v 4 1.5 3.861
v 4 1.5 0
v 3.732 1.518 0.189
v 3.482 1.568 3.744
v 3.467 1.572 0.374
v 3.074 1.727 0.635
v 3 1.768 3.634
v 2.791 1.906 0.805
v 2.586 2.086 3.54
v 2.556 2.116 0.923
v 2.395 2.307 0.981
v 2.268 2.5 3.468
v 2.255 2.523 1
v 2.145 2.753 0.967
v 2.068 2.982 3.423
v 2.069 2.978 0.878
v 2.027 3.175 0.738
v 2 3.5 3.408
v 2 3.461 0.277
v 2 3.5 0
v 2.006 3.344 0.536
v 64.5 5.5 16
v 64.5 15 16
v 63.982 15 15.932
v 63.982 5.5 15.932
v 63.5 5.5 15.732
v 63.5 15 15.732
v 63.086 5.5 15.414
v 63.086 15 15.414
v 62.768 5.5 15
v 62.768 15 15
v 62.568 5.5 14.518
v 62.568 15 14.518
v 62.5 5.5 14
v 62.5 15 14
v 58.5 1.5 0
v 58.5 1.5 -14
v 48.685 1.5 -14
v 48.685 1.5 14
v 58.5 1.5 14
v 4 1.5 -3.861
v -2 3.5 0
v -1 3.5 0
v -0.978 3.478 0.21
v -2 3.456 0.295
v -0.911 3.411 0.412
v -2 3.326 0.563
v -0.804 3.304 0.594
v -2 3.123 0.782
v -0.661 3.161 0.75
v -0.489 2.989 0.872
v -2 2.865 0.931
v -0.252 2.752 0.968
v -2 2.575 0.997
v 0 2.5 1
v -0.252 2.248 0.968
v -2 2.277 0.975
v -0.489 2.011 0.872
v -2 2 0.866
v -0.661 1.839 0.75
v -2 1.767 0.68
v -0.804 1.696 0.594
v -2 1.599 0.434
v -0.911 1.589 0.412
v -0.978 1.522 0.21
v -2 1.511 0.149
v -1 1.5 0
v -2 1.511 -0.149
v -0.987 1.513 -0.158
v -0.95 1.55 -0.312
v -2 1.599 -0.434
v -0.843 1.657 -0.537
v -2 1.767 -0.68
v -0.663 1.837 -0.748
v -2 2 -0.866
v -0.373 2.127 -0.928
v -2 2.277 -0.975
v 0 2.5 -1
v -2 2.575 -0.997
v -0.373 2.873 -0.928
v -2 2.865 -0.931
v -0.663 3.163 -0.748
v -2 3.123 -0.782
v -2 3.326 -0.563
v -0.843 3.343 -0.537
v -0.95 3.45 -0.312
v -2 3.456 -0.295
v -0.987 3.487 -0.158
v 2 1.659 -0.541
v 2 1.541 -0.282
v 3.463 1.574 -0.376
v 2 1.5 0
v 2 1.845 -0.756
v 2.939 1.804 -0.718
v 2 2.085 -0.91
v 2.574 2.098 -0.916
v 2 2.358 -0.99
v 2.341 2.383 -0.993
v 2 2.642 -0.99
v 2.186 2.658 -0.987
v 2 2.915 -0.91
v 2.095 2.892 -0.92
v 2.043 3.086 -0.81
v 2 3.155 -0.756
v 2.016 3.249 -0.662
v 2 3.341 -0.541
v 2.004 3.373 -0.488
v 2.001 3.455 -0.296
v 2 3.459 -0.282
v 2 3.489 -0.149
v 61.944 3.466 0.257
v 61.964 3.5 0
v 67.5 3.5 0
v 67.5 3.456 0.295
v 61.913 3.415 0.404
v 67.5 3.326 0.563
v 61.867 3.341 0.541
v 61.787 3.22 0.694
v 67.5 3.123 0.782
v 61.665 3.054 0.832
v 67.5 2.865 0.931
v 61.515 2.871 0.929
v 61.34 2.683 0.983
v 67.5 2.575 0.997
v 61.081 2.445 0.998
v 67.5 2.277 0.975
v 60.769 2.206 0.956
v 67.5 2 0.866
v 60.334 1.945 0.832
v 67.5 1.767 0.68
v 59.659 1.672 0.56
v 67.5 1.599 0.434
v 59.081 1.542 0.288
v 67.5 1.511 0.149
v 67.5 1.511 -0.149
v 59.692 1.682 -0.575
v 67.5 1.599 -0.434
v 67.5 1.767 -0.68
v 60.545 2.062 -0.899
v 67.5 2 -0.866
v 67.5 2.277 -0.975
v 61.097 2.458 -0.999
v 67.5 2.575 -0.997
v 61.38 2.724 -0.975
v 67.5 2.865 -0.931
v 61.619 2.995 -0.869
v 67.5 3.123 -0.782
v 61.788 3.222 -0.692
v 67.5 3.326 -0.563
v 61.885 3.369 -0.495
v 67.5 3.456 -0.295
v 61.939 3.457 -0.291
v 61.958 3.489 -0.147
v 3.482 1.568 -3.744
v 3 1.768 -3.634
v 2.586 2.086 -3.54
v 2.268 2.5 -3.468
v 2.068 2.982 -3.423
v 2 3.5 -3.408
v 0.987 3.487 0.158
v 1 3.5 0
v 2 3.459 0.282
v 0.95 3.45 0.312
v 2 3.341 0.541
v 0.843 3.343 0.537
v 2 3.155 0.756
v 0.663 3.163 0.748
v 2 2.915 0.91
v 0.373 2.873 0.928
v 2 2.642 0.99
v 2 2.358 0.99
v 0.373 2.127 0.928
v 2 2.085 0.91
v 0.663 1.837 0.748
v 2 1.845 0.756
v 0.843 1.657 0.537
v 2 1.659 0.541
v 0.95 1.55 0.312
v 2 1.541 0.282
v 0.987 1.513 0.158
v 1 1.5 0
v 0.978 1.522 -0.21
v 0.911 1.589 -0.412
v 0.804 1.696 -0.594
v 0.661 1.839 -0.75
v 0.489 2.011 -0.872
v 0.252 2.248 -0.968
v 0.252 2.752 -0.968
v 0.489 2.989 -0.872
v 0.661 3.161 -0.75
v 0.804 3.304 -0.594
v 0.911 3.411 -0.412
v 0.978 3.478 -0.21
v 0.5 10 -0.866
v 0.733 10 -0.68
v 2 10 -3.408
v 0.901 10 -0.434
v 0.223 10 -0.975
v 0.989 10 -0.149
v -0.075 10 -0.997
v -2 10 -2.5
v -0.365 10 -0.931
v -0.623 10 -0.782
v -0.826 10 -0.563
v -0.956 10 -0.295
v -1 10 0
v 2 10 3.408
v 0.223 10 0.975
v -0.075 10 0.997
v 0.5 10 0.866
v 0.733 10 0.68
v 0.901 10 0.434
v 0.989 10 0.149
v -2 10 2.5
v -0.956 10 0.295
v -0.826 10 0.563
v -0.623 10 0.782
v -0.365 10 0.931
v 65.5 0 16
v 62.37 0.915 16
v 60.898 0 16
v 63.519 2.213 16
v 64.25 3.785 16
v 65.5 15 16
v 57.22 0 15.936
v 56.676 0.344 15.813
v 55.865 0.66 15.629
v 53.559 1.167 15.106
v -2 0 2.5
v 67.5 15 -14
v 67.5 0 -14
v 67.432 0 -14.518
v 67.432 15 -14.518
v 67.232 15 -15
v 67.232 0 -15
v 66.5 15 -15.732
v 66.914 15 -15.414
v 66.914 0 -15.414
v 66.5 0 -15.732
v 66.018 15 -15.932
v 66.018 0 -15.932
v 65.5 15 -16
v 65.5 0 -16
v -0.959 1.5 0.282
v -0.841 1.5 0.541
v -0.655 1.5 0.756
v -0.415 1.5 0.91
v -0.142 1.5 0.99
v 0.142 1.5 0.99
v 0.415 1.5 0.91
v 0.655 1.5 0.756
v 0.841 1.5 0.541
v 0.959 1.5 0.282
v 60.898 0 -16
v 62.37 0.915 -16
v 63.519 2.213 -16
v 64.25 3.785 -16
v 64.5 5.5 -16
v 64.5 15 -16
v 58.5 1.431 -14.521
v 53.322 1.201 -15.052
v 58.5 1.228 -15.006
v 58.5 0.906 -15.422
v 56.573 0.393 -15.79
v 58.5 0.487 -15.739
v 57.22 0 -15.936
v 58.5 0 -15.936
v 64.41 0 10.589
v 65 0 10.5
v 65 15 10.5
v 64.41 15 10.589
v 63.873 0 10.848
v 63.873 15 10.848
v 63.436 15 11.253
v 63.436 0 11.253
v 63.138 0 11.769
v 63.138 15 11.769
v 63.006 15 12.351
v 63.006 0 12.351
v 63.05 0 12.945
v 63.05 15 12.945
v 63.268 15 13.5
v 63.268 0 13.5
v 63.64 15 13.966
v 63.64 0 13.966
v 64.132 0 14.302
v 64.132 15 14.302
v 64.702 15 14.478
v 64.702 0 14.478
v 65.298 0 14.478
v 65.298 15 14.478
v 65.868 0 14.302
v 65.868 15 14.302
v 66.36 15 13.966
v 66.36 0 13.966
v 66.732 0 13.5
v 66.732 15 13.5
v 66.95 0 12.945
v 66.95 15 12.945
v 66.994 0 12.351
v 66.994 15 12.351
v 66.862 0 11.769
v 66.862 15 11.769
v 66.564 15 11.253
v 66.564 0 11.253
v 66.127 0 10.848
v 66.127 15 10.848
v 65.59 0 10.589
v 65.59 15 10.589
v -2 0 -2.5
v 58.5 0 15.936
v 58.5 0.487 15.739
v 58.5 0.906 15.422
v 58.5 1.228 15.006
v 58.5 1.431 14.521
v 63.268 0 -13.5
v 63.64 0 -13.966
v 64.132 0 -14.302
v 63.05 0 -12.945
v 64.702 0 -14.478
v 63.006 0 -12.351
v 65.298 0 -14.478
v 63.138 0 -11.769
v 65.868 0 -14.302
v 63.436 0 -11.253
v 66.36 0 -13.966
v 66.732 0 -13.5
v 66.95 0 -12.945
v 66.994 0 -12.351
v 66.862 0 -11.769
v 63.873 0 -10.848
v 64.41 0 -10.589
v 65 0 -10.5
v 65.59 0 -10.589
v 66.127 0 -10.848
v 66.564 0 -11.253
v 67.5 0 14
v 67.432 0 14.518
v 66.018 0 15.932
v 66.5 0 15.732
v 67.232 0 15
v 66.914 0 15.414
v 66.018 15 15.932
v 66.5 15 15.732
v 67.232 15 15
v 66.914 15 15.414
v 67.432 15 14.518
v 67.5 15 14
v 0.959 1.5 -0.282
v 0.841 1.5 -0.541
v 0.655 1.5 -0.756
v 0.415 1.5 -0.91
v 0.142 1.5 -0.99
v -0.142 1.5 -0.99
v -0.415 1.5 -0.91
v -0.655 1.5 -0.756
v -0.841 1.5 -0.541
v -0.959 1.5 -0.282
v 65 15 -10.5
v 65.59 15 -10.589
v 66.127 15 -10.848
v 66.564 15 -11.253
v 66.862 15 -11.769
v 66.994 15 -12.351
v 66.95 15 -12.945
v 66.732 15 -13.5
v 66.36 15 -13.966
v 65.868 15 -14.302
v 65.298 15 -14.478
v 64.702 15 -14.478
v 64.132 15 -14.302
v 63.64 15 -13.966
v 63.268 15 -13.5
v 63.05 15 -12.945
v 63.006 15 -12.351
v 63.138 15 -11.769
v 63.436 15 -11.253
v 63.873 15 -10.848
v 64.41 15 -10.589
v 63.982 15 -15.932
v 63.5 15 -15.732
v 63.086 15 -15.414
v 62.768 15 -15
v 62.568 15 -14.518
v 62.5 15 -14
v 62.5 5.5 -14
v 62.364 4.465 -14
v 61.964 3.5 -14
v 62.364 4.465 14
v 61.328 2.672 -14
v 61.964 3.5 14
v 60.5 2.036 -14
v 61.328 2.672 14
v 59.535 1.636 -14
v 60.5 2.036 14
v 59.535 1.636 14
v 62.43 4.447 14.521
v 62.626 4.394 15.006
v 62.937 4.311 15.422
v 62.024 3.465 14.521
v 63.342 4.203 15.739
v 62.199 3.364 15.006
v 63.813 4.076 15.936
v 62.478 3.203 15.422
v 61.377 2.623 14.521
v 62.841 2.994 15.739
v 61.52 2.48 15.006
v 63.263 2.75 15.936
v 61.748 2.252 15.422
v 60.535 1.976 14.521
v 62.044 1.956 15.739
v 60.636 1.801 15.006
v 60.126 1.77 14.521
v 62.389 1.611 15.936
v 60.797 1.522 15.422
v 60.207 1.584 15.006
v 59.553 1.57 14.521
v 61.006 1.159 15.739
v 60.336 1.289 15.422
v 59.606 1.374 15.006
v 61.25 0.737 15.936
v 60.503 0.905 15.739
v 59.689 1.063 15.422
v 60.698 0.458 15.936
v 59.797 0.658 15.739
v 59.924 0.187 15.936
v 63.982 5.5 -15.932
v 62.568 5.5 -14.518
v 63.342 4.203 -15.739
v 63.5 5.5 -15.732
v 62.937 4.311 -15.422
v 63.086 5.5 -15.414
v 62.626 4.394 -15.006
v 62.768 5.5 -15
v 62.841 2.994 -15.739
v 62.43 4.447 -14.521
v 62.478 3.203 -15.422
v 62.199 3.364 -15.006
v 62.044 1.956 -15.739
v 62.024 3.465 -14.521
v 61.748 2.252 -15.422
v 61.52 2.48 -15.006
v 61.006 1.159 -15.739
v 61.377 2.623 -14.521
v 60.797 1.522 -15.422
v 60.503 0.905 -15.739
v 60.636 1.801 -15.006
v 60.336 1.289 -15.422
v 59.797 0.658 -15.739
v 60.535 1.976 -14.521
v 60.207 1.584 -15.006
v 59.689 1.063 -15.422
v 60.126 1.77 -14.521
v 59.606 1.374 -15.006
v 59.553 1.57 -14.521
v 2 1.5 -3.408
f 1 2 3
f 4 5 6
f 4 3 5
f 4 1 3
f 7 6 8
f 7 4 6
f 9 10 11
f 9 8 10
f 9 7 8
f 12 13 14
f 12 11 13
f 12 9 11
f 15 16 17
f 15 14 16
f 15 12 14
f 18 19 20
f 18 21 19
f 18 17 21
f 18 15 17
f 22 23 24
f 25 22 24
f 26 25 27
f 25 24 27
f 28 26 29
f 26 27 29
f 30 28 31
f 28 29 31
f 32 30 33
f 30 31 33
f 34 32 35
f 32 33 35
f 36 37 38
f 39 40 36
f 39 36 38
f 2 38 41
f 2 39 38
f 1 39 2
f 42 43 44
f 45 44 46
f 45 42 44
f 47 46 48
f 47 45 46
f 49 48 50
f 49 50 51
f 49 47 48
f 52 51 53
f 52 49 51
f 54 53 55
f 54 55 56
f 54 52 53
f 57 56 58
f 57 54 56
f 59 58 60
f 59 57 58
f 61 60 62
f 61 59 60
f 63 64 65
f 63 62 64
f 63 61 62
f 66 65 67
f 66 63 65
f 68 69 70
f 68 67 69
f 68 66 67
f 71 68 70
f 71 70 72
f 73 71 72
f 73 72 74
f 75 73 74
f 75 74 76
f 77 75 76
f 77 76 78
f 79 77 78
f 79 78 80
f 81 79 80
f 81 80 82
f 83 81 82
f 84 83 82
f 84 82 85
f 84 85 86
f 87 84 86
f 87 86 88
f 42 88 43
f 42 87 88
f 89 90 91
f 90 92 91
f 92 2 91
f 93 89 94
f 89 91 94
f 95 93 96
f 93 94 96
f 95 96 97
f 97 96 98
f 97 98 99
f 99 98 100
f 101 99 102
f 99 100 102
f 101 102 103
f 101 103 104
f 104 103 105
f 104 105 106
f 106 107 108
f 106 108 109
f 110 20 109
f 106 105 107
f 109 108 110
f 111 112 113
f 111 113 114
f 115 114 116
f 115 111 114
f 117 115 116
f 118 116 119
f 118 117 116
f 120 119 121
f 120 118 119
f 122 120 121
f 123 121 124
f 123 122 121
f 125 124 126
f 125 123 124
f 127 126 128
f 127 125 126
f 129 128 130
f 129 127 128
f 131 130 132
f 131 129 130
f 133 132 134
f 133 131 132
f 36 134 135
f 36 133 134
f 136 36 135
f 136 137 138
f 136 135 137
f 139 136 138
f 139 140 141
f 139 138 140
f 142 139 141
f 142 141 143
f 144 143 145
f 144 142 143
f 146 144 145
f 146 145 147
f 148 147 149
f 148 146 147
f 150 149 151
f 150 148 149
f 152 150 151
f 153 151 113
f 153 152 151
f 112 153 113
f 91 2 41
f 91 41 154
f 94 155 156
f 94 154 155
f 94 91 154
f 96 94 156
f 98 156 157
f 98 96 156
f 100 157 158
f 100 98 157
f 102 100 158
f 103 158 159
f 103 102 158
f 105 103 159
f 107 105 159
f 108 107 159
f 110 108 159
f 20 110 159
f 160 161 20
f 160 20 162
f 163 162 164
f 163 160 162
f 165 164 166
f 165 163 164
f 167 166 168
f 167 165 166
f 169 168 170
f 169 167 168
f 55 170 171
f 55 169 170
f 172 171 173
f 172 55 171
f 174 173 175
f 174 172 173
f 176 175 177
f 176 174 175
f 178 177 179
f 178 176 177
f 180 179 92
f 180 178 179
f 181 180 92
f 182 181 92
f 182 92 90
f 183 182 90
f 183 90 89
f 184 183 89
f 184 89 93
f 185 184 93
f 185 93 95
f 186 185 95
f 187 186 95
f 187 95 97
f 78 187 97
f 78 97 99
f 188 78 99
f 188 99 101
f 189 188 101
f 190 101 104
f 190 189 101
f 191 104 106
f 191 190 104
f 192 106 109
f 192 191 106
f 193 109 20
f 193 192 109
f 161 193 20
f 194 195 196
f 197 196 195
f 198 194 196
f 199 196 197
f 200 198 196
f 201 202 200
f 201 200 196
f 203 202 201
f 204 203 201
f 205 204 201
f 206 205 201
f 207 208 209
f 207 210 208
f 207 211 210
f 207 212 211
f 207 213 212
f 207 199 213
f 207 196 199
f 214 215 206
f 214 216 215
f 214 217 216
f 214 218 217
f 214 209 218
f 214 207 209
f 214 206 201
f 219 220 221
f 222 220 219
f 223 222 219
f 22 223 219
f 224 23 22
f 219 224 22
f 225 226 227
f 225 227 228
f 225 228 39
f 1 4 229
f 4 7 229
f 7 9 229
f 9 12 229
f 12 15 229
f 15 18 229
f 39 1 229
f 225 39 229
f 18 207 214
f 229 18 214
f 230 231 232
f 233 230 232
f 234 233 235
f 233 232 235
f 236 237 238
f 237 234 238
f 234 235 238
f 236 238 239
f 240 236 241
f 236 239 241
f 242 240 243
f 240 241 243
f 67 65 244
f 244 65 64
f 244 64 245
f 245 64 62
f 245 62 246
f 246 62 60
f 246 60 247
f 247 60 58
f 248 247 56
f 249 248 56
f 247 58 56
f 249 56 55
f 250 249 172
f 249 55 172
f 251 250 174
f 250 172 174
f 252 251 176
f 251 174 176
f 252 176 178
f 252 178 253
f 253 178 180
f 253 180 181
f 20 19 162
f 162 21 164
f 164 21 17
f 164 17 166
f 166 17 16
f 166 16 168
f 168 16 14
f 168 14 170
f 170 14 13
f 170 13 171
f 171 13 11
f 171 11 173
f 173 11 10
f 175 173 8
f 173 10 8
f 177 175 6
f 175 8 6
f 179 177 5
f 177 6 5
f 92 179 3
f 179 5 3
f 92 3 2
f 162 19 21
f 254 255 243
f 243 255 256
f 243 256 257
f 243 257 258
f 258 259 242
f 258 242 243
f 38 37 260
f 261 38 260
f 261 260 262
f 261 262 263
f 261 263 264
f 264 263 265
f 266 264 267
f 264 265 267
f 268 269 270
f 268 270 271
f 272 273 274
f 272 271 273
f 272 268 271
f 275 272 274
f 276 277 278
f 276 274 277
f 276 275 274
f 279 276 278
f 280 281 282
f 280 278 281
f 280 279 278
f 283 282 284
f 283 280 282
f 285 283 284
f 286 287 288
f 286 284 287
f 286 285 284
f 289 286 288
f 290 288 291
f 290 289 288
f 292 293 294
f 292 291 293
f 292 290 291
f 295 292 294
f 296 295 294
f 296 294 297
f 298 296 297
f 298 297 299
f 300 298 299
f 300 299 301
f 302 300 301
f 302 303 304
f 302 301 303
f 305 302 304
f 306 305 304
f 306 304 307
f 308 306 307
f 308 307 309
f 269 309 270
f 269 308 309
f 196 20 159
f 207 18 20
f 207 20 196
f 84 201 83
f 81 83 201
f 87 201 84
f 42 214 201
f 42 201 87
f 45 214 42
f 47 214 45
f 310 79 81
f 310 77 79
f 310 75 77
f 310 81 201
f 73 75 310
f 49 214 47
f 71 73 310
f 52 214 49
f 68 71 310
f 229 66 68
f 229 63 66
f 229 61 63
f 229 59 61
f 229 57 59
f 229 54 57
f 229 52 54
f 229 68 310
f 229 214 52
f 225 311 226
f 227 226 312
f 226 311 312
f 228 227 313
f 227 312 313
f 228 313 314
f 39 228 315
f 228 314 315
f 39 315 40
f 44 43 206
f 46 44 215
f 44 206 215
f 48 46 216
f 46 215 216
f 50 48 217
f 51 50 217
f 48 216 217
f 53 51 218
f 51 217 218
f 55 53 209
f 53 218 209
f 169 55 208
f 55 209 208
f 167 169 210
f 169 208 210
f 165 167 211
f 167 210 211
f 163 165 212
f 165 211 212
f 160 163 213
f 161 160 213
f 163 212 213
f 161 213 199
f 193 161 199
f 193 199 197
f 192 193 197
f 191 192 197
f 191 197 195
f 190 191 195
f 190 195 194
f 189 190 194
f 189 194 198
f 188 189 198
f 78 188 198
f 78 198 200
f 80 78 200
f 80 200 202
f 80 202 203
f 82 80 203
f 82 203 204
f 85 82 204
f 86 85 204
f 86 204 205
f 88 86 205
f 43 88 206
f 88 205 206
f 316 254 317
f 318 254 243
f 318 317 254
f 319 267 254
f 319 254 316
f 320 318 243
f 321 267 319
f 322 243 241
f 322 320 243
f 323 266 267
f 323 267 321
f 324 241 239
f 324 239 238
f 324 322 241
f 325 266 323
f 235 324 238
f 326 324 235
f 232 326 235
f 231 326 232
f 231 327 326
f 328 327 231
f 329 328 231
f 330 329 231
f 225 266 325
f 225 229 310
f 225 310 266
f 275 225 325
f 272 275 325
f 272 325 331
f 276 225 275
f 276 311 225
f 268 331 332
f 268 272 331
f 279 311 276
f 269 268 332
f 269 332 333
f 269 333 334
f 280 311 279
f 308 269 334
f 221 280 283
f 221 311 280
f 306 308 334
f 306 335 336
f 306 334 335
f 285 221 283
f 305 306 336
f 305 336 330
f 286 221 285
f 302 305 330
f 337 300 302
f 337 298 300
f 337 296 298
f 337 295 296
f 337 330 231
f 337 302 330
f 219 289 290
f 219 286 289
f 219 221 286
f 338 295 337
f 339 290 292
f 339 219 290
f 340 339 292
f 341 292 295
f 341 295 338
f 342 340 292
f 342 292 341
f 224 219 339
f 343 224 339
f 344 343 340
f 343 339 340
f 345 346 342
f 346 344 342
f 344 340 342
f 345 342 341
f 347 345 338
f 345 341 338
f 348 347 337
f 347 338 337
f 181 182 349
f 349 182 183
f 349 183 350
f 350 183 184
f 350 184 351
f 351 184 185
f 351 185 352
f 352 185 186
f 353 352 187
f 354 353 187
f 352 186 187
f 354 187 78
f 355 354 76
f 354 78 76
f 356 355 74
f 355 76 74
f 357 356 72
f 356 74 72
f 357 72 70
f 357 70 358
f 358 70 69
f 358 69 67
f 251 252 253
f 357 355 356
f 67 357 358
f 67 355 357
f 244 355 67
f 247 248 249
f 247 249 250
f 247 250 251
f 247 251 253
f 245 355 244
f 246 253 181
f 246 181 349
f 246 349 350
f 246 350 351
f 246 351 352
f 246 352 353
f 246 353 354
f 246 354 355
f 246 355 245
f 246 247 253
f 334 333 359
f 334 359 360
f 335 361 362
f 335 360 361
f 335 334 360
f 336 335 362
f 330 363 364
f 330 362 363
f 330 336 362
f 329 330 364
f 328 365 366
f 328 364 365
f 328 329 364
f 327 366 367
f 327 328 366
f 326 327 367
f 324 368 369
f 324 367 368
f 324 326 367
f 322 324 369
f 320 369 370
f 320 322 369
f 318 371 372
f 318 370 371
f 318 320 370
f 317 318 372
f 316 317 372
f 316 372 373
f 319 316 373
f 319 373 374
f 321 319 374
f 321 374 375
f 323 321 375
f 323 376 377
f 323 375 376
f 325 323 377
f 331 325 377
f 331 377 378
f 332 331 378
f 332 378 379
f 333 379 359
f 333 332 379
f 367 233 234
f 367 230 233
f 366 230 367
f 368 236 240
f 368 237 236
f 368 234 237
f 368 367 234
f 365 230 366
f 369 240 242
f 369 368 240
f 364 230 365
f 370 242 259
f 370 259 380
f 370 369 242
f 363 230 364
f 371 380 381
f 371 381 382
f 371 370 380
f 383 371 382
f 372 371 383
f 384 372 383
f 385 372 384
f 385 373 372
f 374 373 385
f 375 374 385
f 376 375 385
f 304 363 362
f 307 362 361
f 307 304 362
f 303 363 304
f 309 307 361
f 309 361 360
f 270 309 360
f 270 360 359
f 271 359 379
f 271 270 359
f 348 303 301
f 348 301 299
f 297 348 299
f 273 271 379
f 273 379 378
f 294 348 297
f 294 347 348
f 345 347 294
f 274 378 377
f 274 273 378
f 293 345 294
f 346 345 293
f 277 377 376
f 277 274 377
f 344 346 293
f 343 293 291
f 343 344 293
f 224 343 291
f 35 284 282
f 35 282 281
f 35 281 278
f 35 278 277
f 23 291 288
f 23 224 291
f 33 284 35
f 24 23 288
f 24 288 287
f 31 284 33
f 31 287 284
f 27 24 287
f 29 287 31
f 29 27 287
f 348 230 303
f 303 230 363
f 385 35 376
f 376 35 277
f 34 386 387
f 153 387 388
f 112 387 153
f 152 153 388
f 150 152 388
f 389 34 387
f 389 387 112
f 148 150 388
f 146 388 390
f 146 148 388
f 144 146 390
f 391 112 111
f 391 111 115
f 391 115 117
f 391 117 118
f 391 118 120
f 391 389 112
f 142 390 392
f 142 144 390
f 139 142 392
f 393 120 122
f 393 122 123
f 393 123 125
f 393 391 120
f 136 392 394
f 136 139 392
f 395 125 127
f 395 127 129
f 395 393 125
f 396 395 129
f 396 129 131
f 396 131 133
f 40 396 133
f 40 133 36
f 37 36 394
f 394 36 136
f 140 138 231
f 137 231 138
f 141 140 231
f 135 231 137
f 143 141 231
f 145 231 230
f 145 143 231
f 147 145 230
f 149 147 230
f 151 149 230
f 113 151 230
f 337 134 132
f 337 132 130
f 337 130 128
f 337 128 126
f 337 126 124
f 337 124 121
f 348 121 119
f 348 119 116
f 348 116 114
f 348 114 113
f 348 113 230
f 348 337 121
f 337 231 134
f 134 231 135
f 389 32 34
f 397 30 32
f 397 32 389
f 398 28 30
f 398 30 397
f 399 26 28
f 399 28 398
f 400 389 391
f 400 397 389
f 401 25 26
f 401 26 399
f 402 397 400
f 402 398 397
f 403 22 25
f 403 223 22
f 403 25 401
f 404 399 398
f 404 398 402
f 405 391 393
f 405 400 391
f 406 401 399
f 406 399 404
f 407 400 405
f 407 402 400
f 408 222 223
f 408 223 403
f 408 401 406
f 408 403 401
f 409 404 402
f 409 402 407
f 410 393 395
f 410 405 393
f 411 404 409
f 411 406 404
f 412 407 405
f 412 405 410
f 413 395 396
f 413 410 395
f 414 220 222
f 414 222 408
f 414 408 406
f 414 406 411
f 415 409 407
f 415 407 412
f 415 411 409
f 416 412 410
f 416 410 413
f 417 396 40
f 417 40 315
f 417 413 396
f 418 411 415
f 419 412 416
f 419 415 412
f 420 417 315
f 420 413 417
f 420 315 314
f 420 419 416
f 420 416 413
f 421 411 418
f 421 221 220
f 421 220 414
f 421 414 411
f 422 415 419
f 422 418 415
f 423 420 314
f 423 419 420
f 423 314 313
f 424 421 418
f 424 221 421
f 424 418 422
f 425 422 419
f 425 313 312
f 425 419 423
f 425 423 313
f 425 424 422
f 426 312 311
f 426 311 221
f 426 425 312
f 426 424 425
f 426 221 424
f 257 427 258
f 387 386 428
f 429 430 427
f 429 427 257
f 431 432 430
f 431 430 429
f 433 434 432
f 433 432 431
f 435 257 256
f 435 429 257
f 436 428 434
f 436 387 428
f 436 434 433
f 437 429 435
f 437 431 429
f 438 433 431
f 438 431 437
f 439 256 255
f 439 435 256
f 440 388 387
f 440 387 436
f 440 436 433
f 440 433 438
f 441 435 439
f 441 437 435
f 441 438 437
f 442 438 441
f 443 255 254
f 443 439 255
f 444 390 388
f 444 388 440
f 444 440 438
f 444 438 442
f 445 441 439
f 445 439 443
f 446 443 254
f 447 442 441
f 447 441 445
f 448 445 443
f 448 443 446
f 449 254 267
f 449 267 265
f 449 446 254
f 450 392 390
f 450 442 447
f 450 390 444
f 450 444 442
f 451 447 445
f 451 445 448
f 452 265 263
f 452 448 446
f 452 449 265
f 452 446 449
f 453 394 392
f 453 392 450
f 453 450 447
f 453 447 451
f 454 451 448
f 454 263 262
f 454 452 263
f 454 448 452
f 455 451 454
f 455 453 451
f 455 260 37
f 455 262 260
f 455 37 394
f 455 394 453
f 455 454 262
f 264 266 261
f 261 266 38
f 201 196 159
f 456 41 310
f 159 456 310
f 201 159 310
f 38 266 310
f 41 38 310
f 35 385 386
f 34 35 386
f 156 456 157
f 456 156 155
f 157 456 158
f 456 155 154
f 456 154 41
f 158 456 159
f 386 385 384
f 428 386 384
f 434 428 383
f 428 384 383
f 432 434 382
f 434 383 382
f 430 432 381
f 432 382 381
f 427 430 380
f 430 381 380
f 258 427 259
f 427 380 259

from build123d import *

# Parameters (mm, degrees)
BOSS_EXTRUDE1_DEPTH     = 16
CUT_EXTRUDE1_DEPTH      = 71.973586636
CUT_EXTRUDE1_DEPTH_BACK = 71.973586636
SKETCH2_R               = 2
SKETCH3_R               = 1
CUT_EXTRUDE2_DEPTH      = 8.5
FILLET4_R               = 4
CUT_EXTRUDE3_DEPTH      = 70.074235428
CUT_EXTRUDE3_DEPTH_BACK = 70.074235428
SKETCH4_R               = 1
CUT_EXTRUDE4_DEPTH      = 71.671776663
CUT_EXTRUDE4_DEPTH_BACK = 71.671776663
FILLET1_R               = 2


with BuildPart() as part:
    # Sketch1 → Boss-Extrude1 (new, symmetric)
    with BuildSketch(Plane.XY):
        Polygon((-2, 10), (-2, 0), (67.5, 0), (67.5, 15), (62.5, 15), (62.5, 1.5), (2, 1.5), (2, 10), align=None)
    extrude(amount=BOSS_EXTRUDE1_DEPTH, both=True)

    # Sketch2 → Cut-Extrude1 (cut, two sides: drawn at the far end of the back side and taken through both)
    with BuildSketch(Plane(origin=(0, 15, 0), x_dir=(1, 0, 0), z_dir=(0, 1, 0)).offset(-CUT_EXTRUDE1_DEPTH_BACK)):
        with Locations(Location((65, 12.5, 0), (0, 0, 270))):
            Circle(SKETCH2_R)
        with Locations(Location((65, -12.5, 0), (0, 0, 90))):
            Circle(SKETCH2_R)
    extrude(amount=CUT_EXTRUDE1_DEPTH + CUT_EXTRUDE1_DEPTH_BACK, mode=Mode.SUBTRACT)

    # Sketch3 → Cut-Extrude2 (cut)
    with BuildSketch(Plane(origin=(0, 10, 0), x_dir=(1, 0, 0), z_dir=(0, 1, 0))):
        with Locations(Location((0, 0, 0), (0, 0, 180))):
            Circle(SKETCH3_R)
    extrude(amount=-CUT_EXTRUDE2_DEPTH, mode=Mode.SUBTRACT)

    # Fillet4
    fillet4_edges = [part.edges().sort_by_distance(p)[0] for p in [
        (62.5, 1.5, 0),
    ]]
    fillet(fillet4_edges, radius=FILLET4_R)

    # Sketch4 → Cut-Extrude3 (cut, two sides: drawn at the far end of the back side and taken through both)
    with BuildSketch(Plane(origin=(2, 0, 0), x_dir=(0, 0, -1), z_dir=(1, 0, 0)).offset(-CUT_EXTRUDE3_DEPTH_BACK)):
        with Locations(Location((0, 2.5, 0), (0, 0, 90))):
            Circle(SKETCH4_R)
    extrude(amount=CUT_EXTRUDE3_DEPTH + CUT_EXTRUDE3_DEPTH_BACK, mode=Mode.SUBTRACT)

    # Sketch5 → Cut-Extrude4 (cut, two sides: drawn at the far end of the back side and taken through both)
    with BuildSketch(Plane(origin=(0, 1.5, 0), x_dir=(1, 0, 0), z_dir=(0, 1, 0)).offset(-CUT_EXTRUDE4_DEPTH_BACK)):
        Polygon((57.5, 16), (-2, 2.5), (-2, 16), align=None)
        Polygon((57.5, -16), (-2, -2.5), (-2, -16), align=None)
    extrude(amount=CUT_EXTRUDE4_DEPTH + CUT_EXTRUDE4_DEPTH_BACK, mode=Mode.SUBTRACT)

    # Fillet1
    # the kernel refuses this fillet: 2 mm, written as the material it adds along each edge
    with BuildSketch(Plane(origin=(2, 1.5, 8.407563025), x_dir=(1, 0, 0), z_dir=(0, 0, -1))) as fillet1_piece_1_section:
        with BuildLine():
            CenterArc((FILLET1_R, -FILLET1_R), FILLET1_R, 90, 90)
            Line((0, -FILLET1_R), (0, 0))
            Line((0, 0), (FILLET1_R, 0))
        make_face()
    fillet1_piece_1 = extrude(amount=8.407563034, mode=Mode.PRIVATE)
    fillet1_piece_1 = split(fillet1_piece_1, bisect_by=Plane(origin=(3.078912021, 1.5, 3.65235819), z_dir=(0.2212668816339037, 0, -0.9752132931272052)), keep=Keep.TOP, mode=Mode.PRIVATE)
    fillet1_piece_1 = fillet1_piece_1 - Plane(origin=(2, 2.5, 0), x_dir=(0, 1, 0), z_dir=(1, 0, 0)) * Cylinder(1, 25, mode=Mode.PRIVATE)
    add(fillet1_piece_1)
    with BuildSketch(Plane(origin=(2, 1.5, -9e-09), x_dir=(1, 0, 0), z_dir=(0, 0, -1))) as fillet1_piece_2_section:
        with BuildLine():
            CenterArc((FILLET1_R, -FILLET1_R), FILLET1_R, 90, 90)
            Line((0, -FILLET1_R), (0, 0))
            Line((0, 0), (FILLET1_R, 0))
        make_face()
    fillet1_piece_2 = extrude(amount=8.407563016, mode=Mode.PRIVATE)
    fillet1_piece_2 = split(fillet1_piece_2, bisect_by=Plane(origin=(1.26470786, 1.5, -3.240732035), z_dir=(0.2212668816339037, 0, 0.9752132931272052)), keep=Keep.TOP, mode=Mode.PRIVATE)
    fillet1_piece_2 = fillet1_piece_2 - Plane(origin=(2, 2.5, 0), x_dir=(0, 1, 0), z_dir=(1, 0, 0)) * Cylinder(1, 25, mode=Mode.PRIVATE)
    add(fillet1_piece_2)
    # the kernel refuses this fillet: 2 mm, written as the material it takes off along each edge
    with BuildSketch(Plane(origin=(67.5, -5, -16), x_dir=(-1, 0, 0), z_dir=(0, 1, 0)), Plane(origin=(67.5, -5, 16), x_dir=(0, 0, -1), z_dir=(0, 1, 0))) as fillet1_2_piece_1:
        with BuildLine():
            CenterArc((FILLET1_R, FILLET1_R), FILLET1_R, 180, 90)
            Line((0, FILLET1_R), (0, 0))
            Line((0, 0), (FILLET1_R, 0))
        make_face()
    extrude(amount=25, mode=Mode.SUBTRACT)
    with BuildSketch(Plane(origin=(62.5, 20, -16), x_dir=(1, 0, 0), z_dir=(0, -1, 0)), Plane(origin=(62.5, 20, 16), x_dir=(0, 0, -1), z_dir=(0, -1, 0))) as fillet1_2_piece_2:
        with BuildLine():
            CenterArc((FILLET1_R, FILLET1_R), FILLET1_R, 180, 90)
            Line((0, FILLET1_R), (0, 0))
            Line((0, 0), (FILLET1_R, 0))
        make_face()
    extrude(amount=14.5, mode=Mode.SUBTRACT)
    with BuildSketch(Plane(origin=(58.5, 1.5, -16), x_dir=(0, -1, 0), z_dir=(-1, 0, 0)), Plane(origin=(58.5, 1.5, 16), x_dir=(0, 0, -1), z_dir=(-1, 0, 0))) as fillet1_2_piece_3:
        with BuildLine():
            CenterArc((FILLET1_R, FILLET1_R), FILLET1_R, 180, 90)
            Line((0, FILLET1_R), (0, 0))
            Line((0, 0), (FILLET1_R, 0))
        make_face()
    extrude(amount=16, mode=Mode.SUBTRACT)
    with BuildSketch(Plane(origin=(58.5, 5.5, -16), x_dir=(1, 0, 0), z_dir=(0, 1, 0))) as fillet1_2_piece_4:
        with BuildLine():
            CenterArc((4 + FILLET1_R, -FILLET1_R), FILLET1_R, 90, 90)
            Line((4, -FILLET1_R), (4, 0))
            Line((4, 0), (4 + FILLET1_R, 0))
        make_face()
    revolve(axis=Axis((58.5, 5.5, -16), (0, 0, -1)), revolution_arc=90, mode=Mode.SUBTRACT)
    with BuildSketch(Plane(origin=(58.5, 5.5, 16), x_dir=(1, 0, 0), z_dir=(0, 1, 0))) as fillet1_2_piece_5:
        with BuildLine():
            CenterArc((4 + FILLET1_R, FILLET1_R), FILLET1_R, 180, 90)
            Line((4 + FILLET1_R, 0), (4, 0))
            Line((4, 0), (4, FILLET1_R))
        make_face()
    revolve(axis=Axis((58.5, 5.5, 16), (0, 0, -1)), revolution_arc=90, mode=Mode.SUBTRACT)


solid = part.part
